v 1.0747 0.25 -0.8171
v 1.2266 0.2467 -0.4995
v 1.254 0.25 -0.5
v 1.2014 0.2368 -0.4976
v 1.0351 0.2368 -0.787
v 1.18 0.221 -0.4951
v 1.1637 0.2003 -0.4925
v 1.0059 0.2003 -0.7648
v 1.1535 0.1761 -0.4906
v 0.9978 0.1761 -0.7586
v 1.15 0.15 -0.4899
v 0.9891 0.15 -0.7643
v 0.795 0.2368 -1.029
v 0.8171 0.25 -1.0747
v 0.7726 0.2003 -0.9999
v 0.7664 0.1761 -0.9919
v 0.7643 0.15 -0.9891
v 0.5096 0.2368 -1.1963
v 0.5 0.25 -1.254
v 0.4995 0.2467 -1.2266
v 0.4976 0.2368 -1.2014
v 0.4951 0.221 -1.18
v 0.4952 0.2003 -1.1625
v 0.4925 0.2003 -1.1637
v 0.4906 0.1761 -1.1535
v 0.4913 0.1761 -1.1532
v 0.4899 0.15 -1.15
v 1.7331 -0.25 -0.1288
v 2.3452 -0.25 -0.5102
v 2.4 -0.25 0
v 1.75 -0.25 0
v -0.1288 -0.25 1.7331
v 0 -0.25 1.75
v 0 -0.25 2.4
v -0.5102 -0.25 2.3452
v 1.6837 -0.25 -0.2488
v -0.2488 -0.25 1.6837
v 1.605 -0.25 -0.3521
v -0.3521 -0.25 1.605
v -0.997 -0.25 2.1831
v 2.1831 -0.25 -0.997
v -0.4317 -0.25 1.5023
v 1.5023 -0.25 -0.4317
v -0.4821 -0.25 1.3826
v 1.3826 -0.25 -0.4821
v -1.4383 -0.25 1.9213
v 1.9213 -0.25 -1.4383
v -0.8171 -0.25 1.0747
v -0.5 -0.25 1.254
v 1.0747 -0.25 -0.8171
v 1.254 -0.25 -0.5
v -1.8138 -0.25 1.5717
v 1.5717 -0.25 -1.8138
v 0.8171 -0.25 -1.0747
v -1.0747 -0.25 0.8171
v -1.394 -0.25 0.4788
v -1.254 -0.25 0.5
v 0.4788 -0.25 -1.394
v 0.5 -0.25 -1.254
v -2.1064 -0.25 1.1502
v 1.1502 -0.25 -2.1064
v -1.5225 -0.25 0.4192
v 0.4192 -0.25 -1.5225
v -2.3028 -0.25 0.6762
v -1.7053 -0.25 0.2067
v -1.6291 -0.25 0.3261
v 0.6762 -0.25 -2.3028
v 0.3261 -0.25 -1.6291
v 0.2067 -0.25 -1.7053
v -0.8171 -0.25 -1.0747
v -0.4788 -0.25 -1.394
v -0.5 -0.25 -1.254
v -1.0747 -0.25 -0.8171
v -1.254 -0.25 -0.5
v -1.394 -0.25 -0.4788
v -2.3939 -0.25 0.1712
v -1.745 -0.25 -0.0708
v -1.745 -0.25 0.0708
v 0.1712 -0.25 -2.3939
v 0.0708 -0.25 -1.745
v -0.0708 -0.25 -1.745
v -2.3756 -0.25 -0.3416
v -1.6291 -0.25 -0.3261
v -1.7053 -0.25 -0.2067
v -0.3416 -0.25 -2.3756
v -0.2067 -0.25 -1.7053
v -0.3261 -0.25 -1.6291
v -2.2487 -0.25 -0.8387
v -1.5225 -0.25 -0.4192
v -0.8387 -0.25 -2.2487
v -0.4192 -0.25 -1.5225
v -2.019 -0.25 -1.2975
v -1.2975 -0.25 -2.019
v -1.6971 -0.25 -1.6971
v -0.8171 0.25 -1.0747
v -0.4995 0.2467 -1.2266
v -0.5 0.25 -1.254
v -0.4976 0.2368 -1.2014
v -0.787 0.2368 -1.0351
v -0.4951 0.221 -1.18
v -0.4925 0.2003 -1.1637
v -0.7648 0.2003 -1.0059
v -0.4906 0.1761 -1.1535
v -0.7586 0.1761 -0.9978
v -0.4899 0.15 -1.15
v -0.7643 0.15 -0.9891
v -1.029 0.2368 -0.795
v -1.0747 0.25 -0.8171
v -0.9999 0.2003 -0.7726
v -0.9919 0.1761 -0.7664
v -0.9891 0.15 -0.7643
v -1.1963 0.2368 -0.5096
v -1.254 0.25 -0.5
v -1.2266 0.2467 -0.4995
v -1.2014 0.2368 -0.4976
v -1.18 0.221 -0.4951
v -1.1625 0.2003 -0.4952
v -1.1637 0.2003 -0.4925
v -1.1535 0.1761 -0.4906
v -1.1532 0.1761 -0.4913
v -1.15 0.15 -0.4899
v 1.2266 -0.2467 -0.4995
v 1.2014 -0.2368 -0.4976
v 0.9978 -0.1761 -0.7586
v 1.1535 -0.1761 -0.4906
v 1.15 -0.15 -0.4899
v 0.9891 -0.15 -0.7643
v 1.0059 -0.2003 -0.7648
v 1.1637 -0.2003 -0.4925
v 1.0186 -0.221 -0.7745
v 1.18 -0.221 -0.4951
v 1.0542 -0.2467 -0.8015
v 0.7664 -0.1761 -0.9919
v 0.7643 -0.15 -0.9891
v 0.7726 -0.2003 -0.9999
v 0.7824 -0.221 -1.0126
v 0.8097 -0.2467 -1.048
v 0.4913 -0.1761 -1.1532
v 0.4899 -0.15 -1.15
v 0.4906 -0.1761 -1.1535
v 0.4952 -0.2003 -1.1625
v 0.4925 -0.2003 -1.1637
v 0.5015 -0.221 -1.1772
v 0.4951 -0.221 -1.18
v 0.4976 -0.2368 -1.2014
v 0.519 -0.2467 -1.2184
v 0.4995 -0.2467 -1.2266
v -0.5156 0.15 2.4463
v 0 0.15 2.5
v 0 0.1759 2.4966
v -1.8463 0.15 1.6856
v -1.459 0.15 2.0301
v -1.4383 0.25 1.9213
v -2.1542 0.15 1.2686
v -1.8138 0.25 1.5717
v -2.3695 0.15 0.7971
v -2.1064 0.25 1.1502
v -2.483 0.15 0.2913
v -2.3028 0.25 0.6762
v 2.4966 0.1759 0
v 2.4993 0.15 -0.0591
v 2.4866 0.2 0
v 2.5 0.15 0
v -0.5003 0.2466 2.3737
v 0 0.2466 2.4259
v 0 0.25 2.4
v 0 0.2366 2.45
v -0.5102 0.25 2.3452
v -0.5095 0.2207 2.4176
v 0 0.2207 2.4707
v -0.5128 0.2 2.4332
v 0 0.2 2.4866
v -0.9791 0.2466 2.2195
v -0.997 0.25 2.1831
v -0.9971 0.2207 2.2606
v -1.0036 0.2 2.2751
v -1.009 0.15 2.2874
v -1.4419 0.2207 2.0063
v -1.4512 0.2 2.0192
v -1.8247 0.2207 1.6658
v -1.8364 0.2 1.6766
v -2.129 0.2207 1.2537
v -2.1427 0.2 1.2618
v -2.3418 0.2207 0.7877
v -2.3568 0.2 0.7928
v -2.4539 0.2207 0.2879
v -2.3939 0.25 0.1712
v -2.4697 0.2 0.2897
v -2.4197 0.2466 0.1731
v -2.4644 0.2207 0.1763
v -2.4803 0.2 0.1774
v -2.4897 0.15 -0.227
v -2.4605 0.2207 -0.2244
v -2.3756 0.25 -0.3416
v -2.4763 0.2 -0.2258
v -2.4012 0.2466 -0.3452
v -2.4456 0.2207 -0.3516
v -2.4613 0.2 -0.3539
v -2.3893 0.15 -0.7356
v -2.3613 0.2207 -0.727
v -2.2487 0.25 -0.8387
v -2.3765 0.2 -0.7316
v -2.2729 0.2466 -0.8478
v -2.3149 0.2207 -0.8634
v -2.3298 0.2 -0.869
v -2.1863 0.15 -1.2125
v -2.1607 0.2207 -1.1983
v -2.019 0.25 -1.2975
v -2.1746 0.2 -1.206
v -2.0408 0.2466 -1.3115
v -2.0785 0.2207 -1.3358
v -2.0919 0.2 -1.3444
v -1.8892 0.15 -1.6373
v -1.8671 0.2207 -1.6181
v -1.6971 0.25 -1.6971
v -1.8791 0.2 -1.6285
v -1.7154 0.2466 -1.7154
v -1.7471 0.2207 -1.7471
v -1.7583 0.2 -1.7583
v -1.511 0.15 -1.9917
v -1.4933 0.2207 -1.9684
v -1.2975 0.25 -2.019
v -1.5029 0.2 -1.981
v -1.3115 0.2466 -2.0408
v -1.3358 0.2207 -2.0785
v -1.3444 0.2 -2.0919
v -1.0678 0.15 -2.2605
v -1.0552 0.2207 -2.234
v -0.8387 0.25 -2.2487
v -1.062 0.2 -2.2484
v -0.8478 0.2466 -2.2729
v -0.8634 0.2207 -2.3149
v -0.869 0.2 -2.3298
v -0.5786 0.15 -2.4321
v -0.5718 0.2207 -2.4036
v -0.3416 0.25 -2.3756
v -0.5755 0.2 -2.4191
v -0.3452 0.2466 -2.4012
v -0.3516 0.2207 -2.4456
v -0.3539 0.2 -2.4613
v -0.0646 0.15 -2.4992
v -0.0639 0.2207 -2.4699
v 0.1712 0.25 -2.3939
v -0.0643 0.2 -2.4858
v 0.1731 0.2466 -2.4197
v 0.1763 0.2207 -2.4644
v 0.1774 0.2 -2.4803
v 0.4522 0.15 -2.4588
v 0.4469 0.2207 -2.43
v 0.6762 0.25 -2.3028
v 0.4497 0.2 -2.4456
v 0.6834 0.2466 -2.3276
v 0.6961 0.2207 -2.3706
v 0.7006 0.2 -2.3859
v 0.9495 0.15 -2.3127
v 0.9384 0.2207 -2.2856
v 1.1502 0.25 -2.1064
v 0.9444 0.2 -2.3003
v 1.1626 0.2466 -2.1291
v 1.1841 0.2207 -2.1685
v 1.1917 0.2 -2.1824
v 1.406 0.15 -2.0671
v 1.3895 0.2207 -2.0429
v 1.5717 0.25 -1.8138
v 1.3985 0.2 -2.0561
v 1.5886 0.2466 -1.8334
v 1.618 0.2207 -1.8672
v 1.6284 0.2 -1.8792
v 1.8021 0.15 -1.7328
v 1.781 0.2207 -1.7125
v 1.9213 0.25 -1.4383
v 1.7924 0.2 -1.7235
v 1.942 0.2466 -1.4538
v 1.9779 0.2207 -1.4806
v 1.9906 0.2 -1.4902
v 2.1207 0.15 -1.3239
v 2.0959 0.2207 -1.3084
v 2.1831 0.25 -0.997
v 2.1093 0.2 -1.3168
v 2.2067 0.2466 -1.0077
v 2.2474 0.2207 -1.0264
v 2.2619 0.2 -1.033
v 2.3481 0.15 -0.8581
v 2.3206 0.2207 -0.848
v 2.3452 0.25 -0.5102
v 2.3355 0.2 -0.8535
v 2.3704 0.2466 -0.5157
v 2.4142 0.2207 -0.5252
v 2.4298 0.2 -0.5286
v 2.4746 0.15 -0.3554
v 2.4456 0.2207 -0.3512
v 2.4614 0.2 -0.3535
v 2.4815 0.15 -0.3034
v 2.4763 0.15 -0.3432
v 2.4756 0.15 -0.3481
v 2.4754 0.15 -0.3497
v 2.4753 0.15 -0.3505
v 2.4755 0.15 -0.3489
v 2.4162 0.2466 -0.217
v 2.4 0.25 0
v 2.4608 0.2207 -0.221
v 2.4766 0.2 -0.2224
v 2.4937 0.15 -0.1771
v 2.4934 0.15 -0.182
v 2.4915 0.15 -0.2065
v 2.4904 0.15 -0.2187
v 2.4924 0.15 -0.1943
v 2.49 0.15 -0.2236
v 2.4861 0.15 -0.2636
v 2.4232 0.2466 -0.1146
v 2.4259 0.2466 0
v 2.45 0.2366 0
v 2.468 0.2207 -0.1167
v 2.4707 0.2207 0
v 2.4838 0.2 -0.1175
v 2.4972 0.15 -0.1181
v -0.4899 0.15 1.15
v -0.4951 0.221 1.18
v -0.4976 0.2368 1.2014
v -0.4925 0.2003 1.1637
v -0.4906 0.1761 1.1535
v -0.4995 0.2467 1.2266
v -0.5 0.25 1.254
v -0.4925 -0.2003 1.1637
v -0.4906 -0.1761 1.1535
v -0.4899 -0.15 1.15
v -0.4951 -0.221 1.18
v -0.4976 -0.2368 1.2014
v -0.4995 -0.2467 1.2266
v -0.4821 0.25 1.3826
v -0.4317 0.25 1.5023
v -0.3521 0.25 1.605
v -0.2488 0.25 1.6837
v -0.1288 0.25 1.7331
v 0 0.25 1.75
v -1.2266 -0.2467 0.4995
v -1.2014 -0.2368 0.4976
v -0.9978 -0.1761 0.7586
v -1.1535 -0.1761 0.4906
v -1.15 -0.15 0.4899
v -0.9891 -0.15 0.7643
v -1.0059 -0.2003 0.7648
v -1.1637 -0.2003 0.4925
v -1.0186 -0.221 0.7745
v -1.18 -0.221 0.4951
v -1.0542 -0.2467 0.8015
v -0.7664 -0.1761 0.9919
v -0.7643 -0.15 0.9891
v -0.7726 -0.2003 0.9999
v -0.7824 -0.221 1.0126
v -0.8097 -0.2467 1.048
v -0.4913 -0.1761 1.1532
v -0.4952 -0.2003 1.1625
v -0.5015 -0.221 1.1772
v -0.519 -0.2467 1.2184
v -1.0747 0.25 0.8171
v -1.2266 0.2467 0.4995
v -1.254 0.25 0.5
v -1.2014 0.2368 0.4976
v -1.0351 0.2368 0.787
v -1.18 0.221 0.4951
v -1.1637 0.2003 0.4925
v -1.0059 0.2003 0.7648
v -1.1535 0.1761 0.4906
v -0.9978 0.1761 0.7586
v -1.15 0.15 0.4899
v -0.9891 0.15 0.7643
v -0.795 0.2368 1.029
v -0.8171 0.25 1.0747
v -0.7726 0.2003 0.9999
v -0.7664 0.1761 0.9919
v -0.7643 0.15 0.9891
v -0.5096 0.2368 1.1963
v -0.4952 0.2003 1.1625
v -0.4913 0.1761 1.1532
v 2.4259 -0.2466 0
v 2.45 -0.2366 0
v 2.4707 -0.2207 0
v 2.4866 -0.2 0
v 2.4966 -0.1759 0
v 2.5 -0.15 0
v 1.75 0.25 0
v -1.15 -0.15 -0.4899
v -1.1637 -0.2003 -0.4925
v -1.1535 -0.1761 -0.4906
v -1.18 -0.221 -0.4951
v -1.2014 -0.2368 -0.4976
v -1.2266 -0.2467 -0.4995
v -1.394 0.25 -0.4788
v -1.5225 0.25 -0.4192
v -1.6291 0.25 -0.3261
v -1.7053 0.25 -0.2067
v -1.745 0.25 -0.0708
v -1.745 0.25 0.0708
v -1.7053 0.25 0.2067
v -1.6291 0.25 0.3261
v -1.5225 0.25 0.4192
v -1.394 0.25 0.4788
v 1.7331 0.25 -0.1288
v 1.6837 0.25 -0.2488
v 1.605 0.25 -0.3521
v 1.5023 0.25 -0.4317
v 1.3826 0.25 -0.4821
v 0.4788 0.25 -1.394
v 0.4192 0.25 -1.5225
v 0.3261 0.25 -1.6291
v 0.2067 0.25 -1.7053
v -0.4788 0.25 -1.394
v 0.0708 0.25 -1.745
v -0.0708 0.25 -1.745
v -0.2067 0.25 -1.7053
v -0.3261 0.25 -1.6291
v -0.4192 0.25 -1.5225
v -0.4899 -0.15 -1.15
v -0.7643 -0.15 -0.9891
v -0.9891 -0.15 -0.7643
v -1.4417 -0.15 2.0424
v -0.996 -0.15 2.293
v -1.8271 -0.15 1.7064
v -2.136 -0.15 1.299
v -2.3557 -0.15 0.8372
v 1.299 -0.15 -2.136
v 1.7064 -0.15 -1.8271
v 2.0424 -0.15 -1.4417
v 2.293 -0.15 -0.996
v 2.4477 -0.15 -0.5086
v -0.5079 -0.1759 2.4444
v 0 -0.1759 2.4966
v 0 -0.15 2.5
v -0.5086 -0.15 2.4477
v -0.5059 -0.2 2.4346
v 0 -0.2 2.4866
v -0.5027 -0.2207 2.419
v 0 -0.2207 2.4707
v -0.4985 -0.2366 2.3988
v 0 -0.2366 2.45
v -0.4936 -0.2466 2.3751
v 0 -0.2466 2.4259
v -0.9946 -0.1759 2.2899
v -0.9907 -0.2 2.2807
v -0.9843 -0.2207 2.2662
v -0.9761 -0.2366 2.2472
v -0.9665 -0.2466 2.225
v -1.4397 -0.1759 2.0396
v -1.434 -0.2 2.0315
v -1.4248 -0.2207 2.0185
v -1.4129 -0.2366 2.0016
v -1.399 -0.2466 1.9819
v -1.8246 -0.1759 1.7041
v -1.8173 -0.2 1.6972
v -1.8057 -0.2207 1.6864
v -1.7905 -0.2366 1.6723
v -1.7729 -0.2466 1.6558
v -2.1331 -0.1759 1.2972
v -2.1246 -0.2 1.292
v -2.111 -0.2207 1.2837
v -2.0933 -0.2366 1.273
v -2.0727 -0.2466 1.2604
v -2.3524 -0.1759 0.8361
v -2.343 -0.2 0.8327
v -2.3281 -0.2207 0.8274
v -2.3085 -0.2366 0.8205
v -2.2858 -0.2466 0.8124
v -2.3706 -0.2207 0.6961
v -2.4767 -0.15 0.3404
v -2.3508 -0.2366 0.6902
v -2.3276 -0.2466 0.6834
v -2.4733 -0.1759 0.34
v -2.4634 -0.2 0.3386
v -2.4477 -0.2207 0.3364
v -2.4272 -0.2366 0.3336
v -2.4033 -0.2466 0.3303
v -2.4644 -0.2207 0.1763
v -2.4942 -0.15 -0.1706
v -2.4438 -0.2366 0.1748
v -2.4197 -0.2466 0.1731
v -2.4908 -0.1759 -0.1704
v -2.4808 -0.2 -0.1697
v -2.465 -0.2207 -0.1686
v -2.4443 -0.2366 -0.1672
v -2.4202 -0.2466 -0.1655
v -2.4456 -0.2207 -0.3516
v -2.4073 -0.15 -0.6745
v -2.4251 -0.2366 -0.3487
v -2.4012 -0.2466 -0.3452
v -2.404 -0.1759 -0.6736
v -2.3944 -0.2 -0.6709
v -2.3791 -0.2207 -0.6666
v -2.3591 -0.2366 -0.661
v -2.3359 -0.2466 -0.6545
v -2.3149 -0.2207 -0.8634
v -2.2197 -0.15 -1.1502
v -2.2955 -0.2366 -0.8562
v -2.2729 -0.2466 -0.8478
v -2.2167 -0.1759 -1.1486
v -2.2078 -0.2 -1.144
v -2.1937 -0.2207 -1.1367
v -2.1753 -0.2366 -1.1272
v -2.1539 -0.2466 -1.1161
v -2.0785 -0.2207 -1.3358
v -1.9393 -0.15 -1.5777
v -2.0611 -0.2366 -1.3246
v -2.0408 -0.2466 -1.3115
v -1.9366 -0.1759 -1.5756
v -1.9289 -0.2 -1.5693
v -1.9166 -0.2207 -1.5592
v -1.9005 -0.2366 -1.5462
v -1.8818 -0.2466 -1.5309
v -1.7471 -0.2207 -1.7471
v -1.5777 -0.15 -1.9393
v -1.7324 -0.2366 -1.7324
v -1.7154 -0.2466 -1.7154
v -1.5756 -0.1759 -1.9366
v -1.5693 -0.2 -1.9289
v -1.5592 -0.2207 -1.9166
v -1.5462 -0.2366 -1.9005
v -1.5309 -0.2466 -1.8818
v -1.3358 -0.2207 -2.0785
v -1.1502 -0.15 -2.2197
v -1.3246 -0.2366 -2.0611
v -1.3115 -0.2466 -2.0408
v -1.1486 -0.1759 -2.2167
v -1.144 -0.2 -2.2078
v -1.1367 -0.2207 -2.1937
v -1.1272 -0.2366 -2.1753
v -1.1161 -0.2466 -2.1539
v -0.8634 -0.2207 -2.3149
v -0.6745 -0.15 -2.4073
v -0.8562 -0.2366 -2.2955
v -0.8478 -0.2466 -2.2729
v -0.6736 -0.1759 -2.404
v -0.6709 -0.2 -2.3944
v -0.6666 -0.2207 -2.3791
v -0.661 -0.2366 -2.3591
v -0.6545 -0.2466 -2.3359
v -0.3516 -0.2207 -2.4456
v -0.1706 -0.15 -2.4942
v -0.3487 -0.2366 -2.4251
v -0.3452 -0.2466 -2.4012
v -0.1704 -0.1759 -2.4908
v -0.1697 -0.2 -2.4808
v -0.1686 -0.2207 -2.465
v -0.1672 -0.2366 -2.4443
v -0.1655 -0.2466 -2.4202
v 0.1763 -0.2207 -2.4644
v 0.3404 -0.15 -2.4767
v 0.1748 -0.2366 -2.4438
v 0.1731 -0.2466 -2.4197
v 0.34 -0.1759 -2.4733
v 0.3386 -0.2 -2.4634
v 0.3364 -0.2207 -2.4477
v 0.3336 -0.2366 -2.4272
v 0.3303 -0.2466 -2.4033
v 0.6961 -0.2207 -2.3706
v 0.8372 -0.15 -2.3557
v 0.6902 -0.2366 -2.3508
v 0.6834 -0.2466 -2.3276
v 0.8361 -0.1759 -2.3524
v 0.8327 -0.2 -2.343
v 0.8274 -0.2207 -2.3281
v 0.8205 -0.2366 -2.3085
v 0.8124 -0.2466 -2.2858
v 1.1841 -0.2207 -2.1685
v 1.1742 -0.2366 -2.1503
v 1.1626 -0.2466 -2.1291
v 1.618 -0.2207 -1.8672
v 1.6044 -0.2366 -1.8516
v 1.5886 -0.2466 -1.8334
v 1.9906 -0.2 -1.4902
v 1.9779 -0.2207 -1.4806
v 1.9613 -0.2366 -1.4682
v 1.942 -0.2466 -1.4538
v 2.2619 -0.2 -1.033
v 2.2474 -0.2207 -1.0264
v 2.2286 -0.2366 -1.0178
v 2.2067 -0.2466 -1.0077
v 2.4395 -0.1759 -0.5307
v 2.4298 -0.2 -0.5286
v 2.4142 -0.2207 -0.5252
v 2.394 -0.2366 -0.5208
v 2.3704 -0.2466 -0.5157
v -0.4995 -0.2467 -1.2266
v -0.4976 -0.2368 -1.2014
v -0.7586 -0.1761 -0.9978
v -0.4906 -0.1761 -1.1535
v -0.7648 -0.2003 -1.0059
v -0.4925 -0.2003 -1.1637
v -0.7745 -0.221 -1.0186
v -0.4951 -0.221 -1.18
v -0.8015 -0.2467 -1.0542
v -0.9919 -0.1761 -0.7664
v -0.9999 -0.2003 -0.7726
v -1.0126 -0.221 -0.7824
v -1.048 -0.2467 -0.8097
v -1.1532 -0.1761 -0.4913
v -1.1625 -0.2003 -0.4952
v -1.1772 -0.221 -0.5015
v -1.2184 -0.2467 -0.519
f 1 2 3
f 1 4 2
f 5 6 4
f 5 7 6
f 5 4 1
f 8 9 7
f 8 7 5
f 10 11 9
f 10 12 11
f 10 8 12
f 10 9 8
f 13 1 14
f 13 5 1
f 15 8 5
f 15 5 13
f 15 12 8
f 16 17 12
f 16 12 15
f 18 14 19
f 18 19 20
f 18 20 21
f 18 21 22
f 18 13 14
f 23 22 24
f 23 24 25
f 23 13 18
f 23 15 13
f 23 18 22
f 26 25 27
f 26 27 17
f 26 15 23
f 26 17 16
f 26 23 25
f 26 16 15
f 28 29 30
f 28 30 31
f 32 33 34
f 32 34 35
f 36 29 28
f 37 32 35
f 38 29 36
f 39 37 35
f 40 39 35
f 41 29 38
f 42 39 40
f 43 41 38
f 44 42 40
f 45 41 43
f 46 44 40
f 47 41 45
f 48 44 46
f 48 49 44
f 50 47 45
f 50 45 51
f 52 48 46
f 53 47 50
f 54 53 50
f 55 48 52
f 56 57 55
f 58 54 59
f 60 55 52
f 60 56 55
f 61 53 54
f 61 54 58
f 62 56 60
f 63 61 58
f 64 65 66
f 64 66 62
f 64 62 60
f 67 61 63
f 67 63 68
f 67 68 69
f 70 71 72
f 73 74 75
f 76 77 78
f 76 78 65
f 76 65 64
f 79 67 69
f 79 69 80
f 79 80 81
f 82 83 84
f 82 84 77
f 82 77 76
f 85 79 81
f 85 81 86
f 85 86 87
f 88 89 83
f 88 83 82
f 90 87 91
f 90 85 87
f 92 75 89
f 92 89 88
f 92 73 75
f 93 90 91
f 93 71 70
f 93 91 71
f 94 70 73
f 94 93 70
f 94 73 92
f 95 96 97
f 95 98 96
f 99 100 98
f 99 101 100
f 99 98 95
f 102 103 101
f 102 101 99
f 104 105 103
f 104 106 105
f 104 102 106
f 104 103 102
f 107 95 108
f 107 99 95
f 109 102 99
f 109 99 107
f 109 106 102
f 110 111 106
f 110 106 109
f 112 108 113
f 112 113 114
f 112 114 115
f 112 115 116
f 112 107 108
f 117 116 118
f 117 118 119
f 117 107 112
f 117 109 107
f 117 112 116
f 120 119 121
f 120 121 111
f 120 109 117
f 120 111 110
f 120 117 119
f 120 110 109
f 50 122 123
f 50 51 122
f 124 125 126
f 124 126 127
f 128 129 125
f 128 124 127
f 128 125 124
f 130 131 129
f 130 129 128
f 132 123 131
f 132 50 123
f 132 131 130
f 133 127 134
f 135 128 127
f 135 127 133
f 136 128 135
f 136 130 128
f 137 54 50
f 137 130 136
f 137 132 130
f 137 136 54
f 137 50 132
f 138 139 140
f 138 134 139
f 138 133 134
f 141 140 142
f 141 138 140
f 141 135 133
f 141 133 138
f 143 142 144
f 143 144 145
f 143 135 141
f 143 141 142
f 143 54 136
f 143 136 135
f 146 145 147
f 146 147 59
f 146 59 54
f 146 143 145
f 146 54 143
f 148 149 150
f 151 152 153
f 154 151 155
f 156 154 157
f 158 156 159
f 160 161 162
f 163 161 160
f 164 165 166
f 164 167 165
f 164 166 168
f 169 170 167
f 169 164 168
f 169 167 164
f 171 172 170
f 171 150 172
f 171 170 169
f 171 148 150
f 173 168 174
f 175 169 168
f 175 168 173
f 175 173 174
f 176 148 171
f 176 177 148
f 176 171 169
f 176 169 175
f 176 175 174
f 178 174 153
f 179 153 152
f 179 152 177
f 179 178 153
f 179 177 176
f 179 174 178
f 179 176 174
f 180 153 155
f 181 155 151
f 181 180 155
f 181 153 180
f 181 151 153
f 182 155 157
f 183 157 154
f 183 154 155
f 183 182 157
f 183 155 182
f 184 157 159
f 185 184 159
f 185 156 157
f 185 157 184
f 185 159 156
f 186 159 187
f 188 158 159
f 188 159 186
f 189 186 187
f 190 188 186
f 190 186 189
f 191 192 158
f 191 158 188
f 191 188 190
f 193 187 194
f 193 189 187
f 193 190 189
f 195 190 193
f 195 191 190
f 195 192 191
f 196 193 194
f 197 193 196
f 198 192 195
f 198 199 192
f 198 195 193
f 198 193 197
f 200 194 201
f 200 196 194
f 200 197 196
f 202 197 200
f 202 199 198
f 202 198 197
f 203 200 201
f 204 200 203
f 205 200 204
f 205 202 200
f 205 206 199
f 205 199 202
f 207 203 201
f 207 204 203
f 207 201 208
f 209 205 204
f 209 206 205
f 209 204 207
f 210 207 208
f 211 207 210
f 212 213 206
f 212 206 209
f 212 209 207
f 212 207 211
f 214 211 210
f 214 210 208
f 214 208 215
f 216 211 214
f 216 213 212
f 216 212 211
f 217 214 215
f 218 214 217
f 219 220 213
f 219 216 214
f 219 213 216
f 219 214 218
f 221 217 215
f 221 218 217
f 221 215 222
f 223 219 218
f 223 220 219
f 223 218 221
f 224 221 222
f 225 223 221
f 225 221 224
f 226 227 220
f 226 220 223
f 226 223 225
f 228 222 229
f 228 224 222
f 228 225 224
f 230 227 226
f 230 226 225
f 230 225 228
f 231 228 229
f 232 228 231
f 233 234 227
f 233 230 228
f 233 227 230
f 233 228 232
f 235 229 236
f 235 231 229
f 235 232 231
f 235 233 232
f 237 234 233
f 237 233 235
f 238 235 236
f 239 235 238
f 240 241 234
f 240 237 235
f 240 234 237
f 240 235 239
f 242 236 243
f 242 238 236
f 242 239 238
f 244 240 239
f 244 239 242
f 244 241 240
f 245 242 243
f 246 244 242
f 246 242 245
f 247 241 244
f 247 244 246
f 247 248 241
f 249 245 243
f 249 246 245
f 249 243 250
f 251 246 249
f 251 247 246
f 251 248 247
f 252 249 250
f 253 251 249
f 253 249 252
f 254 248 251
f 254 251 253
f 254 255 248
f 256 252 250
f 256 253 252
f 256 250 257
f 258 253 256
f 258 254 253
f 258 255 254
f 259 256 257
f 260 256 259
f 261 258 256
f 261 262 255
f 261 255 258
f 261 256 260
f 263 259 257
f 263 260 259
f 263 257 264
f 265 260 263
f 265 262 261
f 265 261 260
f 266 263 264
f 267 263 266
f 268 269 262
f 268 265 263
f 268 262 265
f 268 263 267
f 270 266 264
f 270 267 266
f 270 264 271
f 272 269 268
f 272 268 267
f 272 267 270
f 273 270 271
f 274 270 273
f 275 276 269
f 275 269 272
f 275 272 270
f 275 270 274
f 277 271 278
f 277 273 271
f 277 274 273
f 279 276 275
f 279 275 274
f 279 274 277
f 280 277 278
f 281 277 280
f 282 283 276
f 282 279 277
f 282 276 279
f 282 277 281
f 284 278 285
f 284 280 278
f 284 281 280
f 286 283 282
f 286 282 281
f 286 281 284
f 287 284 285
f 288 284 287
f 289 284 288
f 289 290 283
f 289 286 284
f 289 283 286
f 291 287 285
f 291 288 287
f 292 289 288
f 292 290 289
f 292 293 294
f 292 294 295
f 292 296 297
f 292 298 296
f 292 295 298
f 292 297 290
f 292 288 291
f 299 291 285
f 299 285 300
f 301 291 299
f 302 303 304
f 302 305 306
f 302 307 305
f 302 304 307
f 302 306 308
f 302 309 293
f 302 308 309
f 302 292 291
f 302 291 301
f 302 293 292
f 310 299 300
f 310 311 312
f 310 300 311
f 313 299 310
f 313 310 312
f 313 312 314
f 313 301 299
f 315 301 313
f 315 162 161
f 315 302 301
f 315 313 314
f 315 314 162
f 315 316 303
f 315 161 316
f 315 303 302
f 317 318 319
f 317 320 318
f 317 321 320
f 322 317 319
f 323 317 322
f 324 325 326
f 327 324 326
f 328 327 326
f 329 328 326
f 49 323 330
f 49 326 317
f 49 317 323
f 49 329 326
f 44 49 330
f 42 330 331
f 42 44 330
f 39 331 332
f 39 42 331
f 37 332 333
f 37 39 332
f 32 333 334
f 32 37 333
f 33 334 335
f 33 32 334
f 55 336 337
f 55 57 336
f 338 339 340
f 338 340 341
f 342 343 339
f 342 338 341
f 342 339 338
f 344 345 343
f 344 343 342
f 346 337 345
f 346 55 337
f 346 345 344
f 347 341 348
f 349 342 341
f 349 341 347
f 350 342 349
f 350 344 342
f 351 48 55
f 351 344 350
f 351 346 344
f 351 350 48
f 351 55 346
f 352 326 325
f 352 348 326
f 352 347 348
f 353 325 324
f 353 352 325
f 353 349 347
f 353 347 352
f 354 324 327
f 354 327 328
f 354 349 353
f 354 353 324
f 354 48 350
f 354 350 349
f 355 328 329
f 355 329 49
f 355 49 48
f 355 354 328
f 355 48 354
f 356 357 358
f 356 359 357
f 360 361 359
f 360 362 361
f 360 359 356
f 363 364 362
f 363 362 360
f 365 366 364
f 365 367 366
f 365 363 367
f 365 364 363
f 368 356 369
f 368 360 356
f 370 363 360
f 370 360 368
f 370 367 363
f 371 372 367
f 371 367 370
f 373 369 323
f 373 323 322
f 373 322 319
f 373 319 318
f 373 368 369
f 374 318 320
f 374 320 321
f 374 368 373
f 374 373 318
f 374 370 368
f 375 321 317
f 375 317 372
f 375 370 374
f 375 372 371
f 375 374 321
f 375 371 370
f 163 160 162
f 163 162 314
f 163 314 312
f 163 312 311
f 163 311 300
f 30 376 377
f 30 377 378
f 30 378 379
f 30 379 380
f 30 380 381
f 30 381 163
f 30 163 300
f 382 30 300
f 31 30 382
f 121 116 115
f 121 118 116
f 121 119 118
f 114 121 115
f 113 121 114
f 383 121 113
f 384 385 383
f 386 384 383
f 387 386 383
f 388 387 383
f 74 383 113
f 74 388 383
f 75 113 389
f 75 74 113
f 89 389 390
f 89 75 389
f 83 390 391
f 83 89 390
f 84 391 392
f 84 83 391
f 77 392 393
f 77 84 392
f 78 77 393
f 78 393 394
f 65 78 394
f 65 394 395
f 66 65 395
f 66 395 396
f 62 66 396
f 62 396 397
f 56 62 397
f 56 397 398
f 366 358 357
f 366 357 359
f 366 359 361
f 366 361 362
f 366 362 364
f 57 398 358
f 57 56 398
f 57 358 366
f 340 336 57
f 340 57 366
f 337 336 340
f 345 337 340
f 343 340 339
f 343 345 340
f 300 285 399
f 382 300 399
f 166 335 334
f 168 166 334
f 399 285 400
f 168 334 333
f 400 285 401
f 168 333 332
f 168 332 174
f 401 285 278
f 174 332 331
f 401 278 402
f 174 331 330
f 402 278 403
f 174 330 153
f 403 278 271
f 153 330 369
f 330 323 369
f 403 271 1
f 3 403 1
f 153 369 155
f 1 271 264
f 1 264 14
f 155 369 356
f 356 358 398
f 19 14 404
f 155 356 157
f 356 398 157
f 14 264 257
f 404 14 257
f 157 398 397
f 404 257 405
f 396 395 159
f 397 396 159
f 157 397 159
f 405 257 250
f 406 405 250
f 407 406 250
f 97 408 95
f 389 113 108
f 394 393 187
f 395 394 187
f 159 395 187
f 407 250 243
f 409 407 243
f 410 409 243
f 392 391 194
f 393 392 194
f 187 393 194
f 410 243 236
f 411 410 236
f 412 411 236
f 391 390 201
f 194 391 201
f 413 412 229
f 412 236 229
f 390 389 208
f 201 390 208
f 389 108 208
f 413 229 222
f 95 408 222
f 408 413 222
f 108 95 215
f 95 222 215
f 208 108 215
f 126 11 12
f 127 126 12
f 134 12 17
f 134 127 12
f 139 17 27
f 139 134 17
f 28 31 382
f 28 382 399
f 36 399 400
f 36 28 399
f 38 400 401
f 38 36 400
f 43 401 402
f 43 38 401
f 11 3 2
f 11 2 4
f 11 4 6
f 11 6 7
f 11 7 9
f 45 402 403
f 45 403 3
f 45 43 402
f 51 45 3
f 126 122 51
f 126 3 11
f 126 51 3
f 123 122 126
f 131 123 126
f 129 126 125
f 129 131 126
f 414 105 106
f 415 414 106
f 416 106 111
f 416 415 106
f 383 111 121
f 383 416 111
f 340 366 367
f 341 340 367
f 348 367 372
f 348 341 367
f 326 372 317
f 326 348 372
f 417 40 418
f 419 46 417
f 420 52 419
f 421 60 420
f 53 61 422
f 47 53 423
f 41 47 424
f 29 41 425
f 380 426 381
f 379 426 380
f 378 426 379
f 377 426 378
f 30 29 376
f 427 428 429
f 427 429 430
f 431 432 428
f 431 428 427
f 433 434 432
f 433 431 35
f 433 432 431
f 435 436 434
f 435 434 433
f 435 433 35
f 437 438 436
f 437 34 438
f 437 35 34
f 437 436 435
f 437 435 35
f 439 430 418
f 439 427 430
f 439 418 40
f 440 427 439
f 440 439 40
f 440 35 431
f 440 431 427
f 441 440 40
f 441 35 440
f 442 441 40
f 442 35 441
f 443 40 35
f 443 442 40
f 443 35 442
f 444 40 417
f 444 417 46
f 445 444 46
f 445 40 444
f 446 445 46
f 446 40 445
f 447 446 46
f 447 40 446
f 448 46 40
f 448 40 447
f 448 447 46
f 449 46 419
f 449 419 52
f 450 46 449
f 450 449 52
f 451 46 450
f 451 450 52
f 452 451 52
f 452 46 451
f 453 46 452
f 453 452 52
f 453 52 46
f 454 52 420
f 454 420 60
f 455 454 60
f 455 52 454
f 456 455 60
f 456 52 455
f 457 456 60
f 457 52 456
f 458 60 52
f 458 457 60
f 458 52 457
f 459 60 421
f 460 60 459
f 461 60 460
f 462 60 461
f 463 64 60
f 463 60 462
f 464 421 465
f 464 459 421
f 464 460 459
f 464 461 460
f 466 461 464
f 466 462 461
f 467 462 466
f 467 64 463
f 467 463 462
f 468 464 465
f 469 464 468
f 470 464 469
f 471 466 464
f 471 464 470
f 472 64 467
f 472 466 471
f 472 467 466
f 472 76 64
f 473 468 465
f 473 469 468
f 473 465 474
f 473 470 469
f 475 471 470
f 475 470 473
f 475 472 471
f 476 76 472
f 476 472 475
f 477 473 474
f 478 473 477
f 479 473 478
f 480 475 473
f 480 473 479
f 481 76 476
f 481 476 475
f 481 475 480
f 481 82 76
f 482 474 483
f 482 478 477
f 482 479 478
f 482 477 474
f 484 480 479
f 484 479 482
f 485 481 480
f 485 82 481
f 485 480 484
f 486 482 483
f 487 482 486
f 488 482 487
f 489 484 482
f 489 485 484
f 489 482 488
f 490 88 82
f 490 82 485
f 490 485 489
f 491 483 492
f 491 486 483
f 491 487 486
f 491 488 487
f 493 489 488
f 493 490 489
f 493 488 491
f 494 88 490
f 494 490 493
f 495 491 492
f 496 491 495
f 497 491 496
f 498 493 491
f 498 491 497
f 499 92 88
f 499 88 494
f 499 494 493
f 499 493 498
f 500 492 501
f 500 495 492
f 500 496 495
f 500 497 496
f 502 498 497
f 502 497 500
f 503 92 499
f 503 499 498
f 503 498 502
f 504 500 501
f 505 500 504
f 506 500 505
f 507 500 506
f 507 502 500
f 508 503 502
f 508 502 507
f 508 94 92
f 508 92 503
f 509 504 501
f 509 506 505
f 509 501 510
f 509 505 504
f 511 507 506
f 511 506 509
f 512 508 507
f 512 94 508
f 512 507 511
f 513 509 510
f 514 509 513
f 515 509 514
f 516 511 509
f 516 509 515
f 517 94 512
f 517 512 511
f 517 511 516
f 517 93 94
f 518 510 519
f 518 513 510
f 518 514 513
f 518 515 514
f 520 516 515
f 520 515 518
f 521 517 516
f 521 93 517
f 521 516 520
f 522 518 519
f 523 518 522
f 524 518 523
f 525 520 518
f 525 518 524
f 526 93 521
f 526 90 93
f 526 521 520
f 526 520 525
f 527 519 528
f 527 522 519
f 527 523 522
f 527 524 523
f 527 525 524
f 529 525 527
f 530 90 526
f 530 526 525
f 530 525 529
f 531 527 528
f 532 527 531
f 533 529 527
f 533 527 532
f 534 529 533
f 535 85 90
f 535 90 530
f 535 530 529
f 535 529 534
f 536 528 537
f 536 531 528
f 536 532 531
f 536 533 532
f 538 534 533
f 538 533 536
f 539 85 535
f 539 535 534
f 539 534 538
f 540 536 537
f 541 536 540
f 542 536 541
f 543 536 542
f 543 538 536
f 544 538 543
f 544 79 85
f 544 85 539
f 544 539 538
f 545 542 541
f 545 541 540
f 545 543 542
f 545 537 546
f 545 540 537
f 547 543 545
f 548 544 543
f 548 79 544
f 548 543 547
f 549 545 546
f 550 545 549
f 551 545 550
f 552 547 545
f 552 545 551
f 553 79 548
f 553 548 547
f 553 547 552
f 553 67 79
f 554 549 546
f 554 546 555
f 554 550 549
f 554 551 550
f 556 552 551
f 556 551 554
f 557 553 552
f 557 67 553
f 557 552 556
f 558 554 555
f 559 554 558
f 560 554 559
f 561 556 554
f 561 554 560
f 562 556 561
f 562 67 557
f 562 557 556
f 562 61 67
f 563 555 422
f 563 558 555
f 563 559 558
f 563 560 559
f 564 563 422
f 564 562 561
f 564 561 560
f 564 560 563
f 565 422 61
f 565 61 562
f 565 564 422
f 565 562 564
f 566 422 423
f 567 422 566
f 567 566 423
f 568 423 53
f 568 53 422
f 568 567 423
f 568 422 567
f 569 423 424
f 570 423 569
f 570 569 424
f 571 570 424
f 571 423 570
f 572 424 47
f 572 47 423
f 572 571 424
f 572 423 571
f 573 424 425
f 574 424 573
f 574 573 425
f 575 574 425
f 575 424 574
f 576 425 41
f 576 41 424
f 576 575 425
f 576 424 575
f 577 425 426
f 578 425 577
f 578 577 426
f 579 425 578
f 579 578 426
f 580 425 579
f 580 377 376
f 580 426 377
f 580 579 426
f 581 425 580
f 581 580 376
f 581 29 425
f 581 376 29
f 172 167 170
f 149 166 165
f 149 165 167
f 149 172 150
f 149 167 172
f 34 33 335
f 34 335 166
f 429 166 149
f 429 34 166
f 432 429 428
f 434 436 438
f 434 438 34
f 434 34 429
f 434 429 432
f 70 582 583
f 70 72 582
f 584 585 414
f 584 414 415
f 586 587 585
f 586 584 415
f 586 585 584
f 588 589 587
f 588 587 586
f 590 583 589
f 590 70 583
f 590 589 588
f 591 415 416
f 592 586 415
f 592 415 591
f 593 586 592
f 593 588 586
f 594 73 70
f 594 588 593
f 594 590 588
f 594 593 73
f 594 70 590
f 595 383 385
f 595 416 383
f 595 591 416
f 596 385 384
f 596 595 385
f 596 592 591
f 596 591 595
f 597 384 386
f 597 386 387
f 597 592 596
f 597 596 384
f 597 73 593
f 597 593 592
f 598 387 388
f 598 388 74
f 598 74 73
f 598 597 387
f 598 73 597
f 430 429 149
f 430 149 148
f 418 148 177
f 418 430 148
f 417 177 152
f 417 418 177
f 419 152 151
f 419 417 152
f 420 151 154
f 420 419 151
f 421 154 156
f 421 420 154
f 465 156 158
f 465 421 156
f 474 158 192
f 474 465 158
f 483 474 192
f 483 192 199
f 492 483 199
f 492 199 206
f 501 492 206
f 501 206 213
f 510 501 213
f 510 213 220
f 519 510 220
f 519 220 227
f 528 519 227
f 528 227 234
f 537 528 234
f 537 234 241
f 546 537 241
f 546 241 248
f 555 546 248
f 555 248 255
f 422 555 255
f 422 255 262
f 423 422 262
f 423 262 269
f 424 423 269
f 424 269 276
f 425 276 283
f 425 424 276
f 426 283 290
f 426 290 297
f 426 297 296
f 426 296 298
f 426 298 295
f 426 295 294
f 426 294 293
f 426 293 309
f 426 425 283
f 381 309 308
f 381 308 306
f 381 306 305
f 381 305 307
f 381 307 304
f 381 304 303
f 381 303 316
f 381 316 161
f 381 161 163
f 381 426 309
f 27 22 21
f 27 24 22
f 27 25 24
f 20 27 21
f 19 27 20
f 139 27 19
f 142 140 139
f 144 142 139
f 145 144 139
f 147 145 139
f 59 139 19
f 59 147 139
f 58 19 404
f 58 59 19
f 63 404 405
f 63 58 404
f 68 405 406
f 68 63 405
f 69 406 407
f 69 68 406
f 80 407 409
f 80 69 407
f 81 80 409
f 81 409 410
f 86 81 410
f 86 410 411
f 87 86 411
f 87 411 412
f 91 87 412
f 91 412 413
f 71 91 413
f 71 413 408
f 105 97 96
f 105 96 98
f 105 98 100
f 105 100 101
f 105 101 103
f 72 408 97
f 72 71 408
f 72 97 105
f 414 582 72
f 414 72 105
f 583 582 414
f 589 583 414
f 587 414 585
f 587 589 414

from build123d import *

# Parameters (mm, degrees)
BOSS_EXTRUDE1_DEPTH      = 0.25
BOSS_EXTRUDE1_DEPTH_BACK = 0.25
FILLET1_R                = 0.1


with BuildPart() as part:
    # Sketch1 → Boss-Extrude1 (new, two sides: drawn at the far end of the back side and taken through both)
    with BuildSketch(Plane(origin=(0, 0, 0), x_dir=(1, 0, 0), z_dir=(0, 1, 0)).offset(-BOSS_EXTRUDE1_DEPTH_BACK)):
        with BuildLine():
            Line((0, -1.75), (0, -2.5))
            ThreePointArc((0, -2.5), (-1.767766953, 1.767766953), (2.5, 0))
            Line((2.5, 0), (1.75, 0))
            ThreePointArc((1.75, 0), (1.566227766, 0.387298335), (1.15, 0.489897949))
            ThreePointArc((1.15, 0.489897949), (0.883883476, 0.883883476), (0.489897949, 1.15))
            ThreePointArc((0.489897949, 1.15), (0, 1.75), (-0.489897949, 1.15))
            ThreePointArc((-0.489897949, 1.15), (-0.883883476, 0.883883476), (-1.15, 0.489897949))
            ThreePointArc((-1.15, 0.489897949), (-1.75, 0), (-1.15, -0.489897949))
            ThreePointArc((-1.15, -0.489897949), (-0.883883476, -0.883883476), (-0.489897949, -1.15))
            ThreePointArc((-0.489897949, -1.15), (-0.387298335, -1.566227766), (0, -1.75))
        make_face()
    extrude(amount=BOSS_EXTRUDE1_DEPTH + BOSS_EXTRUDE1_DEPTH_BACK)

    # Fillet1
    # the kernel refuses this fillet: 0.1 mm, written as the material it takes off along each edge
    with BuildSketch(Plane(origin=(0, -0.25, 0), x_dir=(0.10019395208705734, 0, 0.9949679250936567), z_dir=(0.9949679250936567, 0, -0.10019395208705734))) as fillet1_piece_1:
        with BuildLine():
            CenterArc((2.5 - FILLET1_R, -FILLET1_R), FILLET1_R, 0, 90)
            Line((2.5 - FILLET1_R, 0), (2.5, 0))
            Line((2.5, 0), (2.5, -FILLET1_R))
        make_face()
    revolve(axis=Axis((0, -0.25, 0), (0, -1, 0)), revolution_arc=281.500678412, mode=Mode.SUBTRACT)
    with BuildSketch(Plane(origin=(0, -0.25, 0), x_dir=(-0.9795272488285965, 0, 0.2013116211307253), z_dir=(-0.2013116211307253, 0, -0.9795272488285965))) as fillet1_piece_2:
        with BuildLine():
            CenterArc((1.25 + FILLET1_R, FILLET1_R), FILLET1_R, 180, 90)
            Line((1.25 + FILLET1_R, 0), (1.25, 0))
            Line((1.25, 0), (1.25, FILLET1_R))
        make_face()
    revolve(axis=Axis((0, -0.25, 0), (0, 1, 0)), revolution_arc=66.772660904, mode=Mode.SUBTRACT)
    with BuildSketch(Plane(origin=(0, -0.25, 0), x_dir=(-0.20131162113072518, 0, -0.9795272488285967), z_dir=(0.9795272488285967, 0, -0.20131162113072518))) as fillet1_piece_3:
        with BuildLine():
            CenterArc((1.25 + FILLET1_R, FILLET1_R), FILLET1_R, 180, 90)
            Line((1.25 + FILLET1_R, 0), (1.25, 0))
            Line((1.25, 0), (1.25, FILLET1_R))
        make_face()
    revolve(axis=Axis((0, -0.25, 0), (0, 1, 0)), revolution_arc=66.772660904, mode=Mode.SUBTRACT)
    with BuildSketch(Plane(origin=(0, 0.25, 0), x_dir=(0.10019395208705734, 0, 0.9949679250936567), z_dir=(0.9949679250936567, 0, -0.10019395208705734))) as fillet1_piece_4:
        with BuildLine():
            CenterArc((2.5 - FILLET1_R, FILLET1_R), FILLET1_R, 270, 90)
            Line((2.5 - FILLET1_R, 0), (2.5, 0))
            Line((2.5, 0), (2.5, FILLET1_R))
        make_face()
    revolve(axis=Axis((0, 0.25, 0), (0, -1, 0)), revolution_arc=281.500678412, mode=Mode.SUBTRACT)
    with BuildSketch(Plane(origin=(0, 0.25, 0), x_dir=(-0.9795272488285965, 0, 0.2013116211307253), z_dir=(-0.2013116211307253, 0, -0.9795272488285965))) as fillet1_piece_5:
        with BuildLine():
            CenterArc((1.25 + FILLET1_R, -FILLET1_R), FILLET1_R, 90, 90)
            Line((1.25 + FILLET1_R, 0), (1.25, 0))
            Line((1.25, 0), (1.25, -FILLET1_R))
        make_face()
    revolve(axis=Axis((0, 0.25, 0), (0, 1, 0)), revolution_arc=66.772660904, mode=Mode.SUBTRACT)
    with BuildSketch(Plane(origin=(0, 0.25, 0), x_dir=(-0.20131162113072518, 0, -0.9795272488285967), z_dir=(0.9795272488285967, 0, -0.20131162113072518))) as fillet1_piece_6:
        with BuildLine():
            CenterArc((1.25 + FILLET1_R, -FILLET1_R), FILLET1_R, 90, 90)
            Line((1.25 + FILLET1_R, 0), (1.25, 0))
            Line((1.25, 0), (1.25, -FILLET1_R))
        make_face()
    revolve(axis=Axis((0, 0.25, 0), (0, 1, 0)), revolution_arc=66.772660904, mode=Mode.SUBTRACT)
    with BuildSketch(Plane(origin=(0, 0.25, 0), x_dir=(0.9795272488285964, 0, -0.20131162113072643), z_dir=(0.20131162113072643, 0, 0.9795272488285964))) as fillet1_piece_7:
        with BuildLine():
            CenterArc((1.25 + FILLET1_R, -FILLET1_R), FILLET1_R, 90, 90)
            Line((1.25 + FILLET1_R, 0), (1.25, 0))
            Line((1.25, 0), (1.25, -FILLET1_R))
        make_face()
    revolve(axis=Axis((0, 0.25, 0), (0, 1, 0)), revolution_arc=66.772660904, mode=Mode.SUBTRACT)
    with BuildSketch(Plane(origin=(0, -0.25, 0), x_dir=(0.9795272488285964, 0, -0.20131162113072643), z_dir=(0.20131162113072643, 0, 0.9795272488285964))) as fillet1_piece_8:
        with BuildLine():
            CenterArc((1.25 + FILLET1_R, FILLET1_R), FILLET1_R, 180, 90)
            Line((1.25 + FILLET1_R, 0), (1.25, 0))
            Line((1.25, 0), (1.25, FILLET1_R))
        make_face()
    revolve(axis=Axis((0, -0.25, 0), (0, 1, 0)), revolution_arc=66.772660904, mode=Mode.SUBTRACT)


solid = part.part
